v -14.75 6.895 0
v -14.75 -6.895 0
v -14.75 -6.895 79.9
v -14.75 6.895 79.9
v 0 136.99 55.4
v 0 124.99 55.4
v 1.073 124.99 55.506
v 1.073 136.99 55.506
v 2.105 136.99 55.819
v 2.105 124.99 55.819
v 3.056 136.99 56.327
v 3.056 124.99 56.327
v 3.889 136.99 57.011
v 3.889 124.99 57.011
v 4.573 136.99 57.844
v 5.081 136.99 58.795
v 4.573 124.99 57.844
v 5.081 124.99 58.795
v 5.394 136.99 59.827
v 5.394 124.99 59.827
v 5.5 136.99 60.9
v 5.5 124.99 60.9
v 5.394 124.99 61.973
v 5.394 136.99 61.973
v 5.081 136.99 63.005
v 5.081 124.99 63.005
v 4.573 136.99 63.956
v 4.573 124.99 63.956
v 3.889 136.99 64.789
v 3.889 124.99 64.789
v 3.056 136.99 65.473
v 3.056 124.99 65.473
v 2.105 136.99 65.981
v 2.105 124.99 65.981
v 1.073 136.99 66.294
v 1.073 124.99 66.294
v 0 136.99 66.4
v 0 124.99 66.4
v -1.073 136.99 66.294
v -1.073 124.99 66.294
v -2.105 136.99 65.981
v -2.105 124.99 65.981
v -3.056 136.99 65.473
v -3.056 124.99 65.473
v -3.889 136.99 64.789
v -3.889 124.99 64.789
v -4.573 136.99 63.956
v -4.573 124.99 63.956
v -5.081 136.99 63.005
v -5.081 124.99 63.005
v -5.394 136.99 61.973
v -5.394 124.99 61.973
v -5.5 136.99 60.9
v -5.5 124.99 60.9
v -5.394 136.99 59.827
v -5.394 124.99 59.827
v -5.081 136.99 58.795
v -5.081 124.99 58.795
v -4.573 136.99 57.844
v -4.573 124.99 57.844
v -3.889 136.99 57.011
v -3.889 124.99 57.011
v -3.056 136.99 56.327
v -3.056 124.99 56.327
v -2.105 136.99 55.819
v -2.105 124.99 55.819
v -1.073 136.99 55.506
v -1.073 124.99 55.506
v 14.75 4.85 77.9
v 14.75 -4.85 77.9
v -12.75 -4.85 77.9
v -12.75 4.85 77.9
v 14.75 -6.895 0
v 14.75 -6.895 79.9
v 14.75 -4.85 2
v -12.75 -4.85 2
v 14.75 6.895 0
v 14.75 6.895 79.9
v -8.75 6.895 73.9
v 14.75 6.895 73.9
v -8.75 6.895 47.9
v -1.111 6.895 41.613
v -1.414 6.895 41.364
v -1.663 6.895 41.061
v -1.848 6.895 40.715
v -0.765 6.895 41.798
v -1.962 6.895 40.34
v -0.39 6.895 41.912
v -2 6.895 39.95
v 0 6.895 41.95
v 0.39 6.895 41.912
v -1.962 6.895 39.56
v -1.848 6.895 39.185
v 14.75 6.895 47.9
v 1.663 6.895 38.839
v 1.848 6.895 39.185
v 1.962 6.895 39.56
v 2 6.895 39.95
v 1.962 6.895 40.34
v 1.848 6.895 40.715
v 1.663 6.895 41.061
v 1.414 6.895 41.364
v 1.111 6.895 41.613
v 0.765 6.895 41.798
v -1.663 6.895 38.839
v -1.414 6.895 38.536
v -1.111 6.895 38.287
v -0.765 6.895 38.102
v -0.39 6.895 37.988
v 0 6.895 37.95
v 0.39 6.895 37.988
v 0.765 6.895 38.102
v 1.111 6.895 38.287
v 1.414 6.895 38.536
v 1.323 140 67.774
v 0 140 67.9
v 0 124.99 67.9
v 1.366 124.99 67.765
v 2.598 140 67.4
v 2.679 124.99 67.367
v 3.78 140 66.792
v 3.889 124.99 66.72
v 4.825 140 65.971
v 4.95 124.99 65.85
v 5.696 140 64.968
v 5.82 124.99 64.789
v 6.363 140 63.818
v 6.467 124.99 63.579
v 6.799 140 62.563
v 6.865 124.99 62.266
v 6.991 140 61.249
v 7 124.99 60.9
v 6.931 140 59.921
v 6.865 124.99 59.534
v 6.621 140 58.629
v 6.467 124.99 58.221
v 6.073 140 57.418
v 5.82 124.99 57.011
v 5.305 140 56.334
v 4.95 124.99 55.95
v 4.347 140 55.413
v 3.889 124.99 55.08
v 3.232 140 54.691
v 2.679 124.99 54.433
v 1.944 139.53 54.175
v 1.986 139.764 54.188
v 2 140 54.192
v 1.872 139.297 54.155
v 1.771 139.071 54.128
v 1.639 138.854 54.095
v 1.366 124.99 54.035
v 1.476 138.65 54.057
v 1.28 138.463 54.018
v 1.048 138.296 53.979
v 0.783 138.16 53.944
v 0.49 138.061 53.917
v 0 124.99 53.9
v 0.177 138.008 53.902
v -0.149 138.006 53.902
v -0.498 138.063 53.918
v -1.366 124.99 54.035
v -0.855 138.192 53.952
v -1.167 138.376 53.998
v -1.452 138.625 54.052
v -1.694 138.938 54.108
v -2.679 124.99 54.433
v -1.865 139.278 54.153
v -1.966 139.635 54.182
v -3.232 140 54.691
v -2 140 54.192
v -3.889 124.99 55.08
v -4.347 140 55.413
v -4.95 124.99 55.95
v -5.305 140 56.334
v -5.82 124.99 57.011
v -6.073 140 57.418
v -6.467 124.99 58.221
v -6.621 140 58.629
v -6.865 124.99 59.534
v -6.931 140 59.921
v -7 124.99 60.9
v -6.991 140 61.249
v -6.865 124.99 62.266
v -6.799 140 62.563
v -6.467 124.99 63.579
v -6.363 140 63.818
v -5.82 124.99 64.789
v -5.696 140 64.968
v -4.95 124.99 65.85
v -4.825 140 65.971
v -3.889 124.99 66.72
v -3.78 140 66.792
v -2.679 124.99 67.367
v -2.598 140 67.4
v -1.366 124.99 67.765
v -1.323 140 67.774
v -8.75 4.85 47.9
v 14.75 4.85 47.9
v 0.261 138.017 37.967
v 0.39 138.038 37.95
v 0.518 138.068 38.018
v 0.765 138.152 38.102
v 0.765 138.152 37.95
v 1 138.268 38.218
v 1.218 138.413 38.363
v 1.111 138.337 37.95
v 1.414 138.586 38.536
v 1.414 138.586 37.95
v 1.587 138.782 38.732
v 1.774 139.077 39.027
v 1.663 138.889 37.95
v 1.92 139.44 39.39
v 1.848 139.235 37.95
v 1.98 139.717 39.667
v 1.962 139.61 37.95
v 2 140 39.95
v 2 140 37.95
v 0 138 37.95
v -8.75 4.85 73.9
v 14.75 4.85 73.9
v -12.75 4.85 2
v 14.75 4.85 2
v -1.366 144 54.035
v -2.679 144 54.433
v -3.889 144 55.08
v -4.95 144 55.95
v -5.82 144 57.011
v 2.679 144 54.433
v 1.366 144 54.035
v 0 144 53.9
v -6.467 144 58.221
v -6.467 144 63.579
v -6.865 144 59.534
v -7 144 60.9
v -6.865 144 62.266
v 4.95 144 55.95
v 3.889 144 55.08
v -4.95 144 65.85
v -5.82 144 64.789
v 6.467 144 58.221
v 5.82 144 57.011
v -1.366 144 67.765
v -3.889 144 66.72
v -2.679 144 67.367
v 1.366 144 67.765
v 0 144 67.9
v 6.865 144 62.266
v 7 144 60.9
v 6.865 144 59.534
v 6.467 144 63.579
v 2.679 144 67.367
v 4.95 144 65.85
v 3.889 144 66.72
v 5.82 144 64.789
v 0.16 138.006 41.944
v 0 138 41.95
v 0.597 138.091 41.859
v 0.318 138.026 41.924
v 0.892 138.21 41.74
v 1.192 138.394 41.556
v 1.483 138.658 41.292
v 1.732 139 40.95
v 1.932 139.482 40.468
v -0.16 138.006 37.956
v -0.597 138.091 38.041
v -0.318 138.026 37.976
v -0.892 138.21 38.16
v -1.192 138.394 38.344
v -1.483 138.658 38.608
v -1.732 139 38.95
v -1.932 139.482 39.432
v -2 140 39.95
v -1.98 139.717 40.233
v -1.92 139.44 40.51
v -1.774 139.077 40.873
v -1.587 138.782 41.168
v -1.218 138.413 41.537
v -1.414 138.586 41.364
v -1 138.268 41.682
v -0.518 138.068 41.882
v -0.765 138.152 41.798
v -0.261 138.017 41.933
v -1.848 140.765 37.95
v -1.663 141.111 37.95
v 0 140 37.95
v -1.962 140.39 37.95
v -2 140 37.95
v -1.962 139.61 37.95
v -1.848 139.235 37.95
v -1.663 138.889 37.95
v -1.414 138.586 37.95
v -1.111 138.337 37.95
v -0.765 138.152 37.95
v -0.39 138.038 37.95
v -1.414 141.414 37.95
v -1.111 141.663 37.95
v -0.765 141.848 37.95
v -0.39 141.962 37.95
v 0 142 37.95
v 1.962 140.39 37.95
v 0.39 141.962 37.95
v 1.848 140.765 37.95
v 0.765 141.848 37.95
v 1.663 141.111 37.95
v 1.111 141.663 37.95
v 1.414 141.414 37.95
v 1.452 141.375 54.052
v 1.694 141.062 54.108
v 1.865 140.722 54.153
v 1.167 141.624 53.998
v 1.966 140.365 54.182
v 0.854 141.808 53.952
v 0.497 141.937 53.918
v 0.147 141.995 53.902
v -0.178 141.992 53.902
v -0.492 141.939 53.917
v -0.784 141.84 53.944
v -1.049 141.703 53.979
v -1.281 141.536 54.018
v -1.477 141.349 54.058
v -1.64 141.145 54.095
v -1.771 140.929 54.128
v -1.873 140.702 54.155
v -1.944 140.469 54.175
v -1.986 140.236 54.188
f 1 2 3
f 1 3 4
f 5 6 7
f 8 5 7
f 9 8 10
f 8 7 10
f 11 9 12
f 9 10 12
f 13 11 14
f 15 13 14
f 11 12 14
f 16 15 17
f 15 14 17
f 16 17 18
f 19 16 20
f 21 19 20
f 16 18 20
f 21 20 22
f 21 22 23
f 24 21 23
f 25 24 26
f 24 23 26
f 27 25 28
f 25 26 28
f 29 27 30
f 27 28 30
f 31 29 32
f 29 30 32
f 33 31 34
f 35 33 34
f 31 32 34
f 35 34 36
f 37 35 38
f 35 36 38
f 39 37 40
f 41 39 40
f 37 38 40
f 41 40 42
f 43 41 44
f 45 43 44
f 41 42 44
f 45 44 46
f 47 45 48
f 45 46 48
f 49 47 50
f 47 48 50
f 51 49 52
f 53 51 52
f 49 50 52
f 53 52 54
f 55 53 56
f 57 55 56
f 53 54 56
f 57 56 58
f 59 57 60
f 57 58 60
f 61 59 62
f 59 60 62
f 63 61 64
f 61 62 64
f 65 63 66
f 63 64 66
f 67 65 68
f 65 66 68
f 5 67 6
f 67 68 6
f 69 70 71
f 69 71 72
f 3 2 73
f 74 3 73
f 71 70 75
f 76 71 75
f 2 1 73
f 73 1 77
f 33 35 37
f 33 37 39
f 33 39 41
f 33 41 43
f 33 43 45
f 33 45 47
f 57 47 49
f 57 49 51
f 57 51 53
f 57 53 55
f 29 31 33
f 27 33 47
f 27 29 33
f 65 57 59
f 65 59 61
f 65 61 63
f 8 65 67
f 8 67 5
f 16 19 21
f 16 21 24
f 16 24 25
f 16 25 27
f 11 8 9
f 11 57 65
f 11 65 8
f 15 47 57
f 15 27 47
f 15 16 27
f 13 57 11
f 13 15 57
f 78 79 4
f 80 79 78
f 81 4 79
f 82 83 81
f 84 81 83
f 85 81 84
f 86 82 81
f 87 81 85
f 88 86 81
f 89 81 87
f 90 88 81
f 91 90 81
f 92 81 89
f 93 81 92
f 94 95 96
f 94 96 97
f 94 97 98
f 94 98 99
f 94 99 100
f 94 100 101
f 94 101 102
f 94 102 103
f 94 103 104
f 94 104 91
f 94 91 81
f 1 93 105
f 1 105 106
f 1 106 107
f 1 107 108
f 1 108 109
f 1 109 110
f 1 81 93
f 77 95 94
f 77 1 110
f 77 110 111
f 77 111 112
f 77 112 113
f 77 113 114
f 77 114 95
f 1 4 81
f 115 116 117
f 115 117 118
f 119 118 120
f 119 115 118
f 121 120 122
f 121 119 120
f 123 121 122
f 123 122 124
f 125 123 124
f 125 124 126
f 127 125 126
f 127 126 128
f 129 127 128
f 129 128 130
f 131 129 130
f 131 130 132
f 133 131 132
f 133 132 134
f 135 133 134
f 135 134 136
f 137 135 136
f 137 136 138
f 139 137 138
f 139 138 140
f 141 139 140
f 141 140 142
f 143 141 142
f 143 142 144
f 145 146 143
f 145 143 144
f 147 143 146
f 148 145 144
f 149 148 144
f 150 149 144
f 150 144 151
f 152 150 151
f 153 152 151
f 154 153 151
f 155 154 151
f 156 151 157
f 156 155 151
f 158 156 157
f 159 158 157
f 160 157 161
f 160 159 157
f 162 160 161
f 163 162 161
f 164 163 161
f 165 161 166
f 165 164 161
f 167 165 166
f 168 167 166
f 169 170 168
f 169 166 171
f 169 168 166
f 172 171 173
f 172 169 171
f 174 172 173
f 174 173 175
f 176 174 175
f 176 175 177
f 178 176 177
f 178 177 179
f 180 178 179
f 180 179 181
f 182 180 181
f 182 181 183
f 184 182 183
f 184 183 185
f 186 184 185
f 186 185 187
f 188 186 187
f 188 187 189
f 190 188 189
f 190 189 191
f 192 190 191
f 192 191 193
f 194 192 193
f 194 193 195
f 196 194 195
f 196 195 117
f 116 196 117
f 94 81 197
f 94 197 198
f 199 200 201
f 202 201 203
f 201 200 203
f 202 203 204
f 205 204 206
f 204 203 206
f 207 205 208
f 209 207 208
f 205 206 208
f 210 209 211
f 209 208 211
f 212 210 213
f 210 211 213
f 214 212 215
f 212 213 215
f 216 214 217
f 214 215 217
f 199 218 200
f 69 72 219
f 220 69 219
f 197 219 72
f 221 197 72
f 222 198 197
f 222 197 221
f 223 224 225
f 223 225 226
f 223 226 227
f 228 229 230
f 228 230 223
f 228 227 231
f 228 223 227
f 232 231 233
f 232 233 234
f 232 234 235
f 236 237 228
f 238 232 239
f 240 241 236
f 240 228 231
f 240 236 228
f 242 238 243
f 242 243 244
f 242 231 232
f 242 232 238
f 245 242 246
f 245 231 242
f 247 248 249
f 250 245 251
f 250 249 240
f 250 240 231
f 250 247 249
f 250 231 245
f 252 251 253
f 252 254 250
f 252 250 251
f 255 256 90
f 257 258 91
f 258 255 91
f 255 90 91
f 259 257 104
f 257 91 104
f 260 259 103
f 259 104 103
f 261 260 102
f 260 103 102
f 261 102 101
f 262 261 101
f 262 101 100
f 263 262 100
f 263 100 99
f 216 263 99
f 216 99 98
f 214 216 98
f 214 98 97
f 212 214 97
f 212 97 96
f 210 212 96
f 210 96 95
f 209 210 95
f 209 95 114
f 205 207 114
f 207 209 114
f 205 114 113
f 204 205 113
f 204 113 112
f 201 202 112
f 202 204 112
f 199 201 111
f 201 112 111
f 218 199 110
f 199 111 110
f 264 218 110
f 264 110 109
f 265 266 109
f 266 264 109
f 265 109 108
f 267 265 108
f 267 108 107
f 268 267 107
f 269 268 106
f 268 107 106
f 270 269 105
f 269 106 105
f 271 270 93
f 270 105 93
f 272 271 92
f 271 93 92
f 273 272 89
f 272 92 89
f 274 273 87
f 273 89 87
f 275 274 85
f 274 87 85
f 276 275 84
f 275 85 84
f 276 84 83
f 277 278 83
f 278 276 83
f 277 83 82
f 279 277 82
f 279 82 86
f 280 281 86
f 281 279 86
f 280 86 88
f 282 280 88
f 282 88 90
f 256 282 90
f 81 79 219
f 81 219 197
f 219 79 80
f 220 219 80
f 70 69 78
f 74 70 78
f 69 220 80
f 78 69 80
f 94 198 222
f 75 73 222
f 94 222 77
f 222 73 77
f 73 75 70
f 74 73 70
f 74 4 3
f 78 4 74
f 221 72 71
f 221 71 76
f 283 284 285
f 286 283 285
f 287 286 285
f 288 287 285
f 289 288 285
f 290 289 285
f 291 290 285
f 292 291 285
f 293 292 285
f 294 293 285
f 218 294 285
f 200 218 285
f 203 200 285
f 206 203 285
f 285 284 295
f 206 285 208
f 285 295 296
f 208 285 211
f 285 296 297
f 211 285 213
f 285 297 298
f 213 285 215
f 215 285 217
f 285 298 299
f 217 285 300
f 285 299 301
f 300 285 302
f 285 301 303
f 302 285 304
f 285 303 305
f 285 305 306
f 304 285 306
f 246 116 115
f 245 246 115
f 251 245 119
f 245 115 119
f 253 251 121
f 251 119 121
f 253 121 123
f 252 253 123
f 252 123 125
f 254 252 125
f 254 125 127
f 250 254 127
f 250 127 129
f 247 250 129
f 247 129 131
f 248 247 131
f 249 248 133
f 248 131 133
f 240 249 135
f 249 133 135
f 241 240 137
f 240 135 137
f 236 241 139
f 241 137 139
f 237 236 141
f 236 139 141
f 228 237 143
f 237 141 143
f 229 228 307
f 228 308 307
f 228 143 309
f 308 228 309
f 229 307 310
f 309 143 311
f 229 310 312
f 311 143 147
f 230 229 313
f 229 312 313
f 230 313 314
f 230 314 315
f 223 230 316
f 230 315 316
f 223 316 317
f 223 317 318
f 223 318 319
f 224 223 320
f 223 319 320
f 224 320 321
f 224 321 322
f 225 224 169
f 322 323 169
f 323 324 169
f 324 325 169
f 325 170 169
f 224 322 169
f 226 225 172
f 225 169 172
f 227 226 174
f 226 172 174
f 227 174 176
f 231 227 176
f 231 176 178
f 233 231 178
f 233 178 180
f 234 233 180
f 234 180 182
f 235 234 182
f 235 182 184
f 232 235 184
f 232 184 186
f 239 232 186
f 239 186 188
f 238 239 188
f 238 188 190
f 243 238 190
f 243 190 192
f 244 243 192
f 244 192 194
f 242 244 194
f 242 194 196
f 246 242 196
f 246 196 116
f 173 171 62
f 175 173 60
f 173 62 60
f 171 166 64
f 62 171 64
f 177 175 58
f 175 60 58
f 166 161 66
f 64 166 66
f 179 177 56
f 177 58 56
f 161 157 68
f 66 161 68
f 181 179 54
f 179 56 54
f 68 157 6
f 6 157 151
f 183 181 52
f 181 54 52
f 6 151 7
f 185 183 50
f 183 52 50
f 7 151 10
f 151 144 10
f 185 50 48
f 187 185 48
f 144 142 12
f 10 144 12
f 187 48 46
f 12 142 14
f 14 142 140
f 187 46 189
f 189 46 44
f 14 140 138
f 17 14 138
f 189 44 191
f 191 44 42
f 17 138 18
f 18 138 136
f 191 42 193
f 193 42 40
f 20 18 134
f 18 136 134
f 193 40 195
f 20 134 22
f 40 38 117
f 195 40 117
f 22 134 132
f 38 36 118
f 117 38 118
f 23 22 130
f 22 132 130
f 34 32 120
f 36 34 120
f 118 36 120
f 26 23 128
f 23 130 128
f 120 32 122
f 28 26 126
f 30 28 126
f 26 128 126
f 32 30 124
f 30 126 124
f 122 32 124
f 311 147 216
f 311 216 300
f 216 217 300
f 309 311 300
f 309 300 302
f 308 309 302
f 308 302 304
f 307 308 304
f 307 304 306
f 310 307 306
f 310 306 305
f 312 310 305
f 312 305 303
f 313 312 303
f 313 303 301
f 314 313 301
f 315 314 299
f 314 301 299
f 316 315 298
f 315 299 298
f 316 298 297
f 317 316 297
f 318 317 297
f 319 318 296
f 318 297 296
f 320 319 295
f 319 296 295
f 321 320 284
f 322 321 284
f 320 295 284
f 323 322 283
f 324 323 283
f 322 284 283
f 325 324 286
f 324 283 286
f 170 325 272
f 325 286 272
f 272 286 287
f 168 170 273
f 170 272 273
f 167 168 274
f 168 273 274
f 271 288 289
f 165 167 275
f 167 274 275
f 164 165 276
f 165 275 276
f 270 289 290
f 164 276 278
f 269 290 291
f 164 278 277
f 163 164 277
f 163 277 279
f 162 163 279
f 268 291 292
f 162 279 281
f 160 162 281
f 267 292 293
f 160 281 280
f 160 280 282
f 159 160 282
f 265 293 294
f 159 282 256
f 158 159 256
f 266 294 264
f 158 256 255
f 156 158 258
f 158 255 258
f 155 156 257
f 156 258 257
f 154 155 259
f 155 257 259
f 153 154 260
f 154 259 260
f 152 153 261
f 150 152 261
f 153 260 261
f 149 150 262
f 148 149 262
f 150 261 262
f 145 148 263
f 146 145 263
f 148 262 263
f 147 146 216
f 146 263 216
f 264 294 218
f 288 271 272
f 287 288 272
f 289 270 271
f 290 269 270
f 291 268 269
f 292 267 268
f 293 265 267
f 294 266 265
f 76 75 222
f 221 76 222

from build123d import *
from build123d.topology import SkipClean

# Parameters (mm, degrees)
SKETCH4_R           = 2
BOSS_EXTRUDE1_DEPTH = 140
SKETCH5_W           = 29.5
SKETCH5_H           = 13.79
BOSS_EXTRUDE3_DEPTH = 79.9
SKETCH6_W           = 75.9
SKETCH6_H           = 9.7
CUT_EXTRUDE1_DEPTH  = 27.5
SKETCH7_W           = 23.5
SKETCH7_H           = 26
CUT_EXTRUDE2_DEPTH  = 3
SKETCH8_R           = 2
BOSS_EXTRUDE4_DEPTH = 22.95
SKETCH12_R          = 7
BOSS_EXTRUDE6_DEPTH = 15.01
SKETCH13_R          = 7
BOSS_EXTRUDE7_DEPTH = 4
SKETCH14_R          = 5.5
CUT_EXTRUDE3_DEPTH  = 12


with BuildPart() as part:
    # Sketch4 → Boss-Extrude1 (new body)
    with BuildSketch(Plane(origin=(0, 0, 0), x_dir=(1, 0, 0), z_dir=(0, 1, 0))):
        with Locations(Location((0, -39.95, 0), (0, 0, 270))):
            Circle(SKETCH4_R)
    extrude(amount=BOSS_EXTRUDE1_DEPTH)

    # Sketch5 → Boss-Extrude3 (add)
    with BuildSketch(Plane.XY):
        Rectangle(SKETCH5_W, SKETCH5_H)
    extrude(amount=BOSS_EXTRUDE3_DEPTH)

    # Sketch6 → Cut-Extrude1 (cut)
    with BuildSketch(Plane(origin=(14.75, 0, 0), x_dir=(0, 0, -1), z_dir=(1, 0, 0))):
        with Locations((-39.95, 0)):
            Rectangle(SKETCH6_W, SKETCH6_H)
    extrude(amount=-CUT_EXTRUDE1_DEPTH, mode=Mode.SUBTRACT)

    # Sketch7 → Cut-Extrude2 (cut)
    with BuildSketch(Plane(origin=(0, 6.895, 0), x_dir=(1, 0, 0), z_dir=(0, 1, 0))):
        with Locations((3, -60.9)):
            Rectangle(SKETCH7_W, SKETCH7_H)
    extrude(amount=-CUT_EXTRUDE2_DEPTH, mode=Mode.SUBTRACT)

    # Sketch8 → Boss-Extrude4 (add)
    with SkipClean():  # the faces are left unmerged after this step: merging them gives an invalid solid
        with BuildSketch(Plane.XY.offset(37.95)):
            with Locations((0, 140)):
                Circle(SKETCH8_R)
        extrude(amount=BOSS_EXTRUDE4_DEPTH)

    # Sketch12 → Boss-Extrude6 (add)
    with SkipClean():  # the faces are left unmerged after this step: merging them gives an invalid solid
        with BuildSketch(Plane(origin=(0, 140, 0), x_dir=(1, 0, 0), z_dir=(0, 1, 0))):
            with Locations(Location((0, -60.9, 0), (0, 0, 270))):
                Circle(SKETCH12_R)
        extrude(amount=-BOSS_EXTRUDE6_DEPTH)

    # Sketch13 → Boss-Extrude7 (add)
    with SkipClean():  # the faces are left unmerged after this step: merging them gives an invalid solid
        with BuildSketch(Plane(origin=(0, 140, 0), x_dir=(1, 0, 0), z_dir=(0, 1, 0))):
            with Locations(Location((0, -60.9, 0), (0, 0, 270))):
                Circle(SKETCH13_R)
        extrude(amount=BOSS_EXTRUDE7_DEPTH)

    # Sketch14 → Cut-Extrude3 (cut)
    with SkipClean():  # the faces are left unmerged after this step: merging them gives an invalid solid
        with BuildSketch(Plane.XZ.offset(-124.99)):
            with Locations(Location((0, 60.9, 0), (0, 0, 270))):
                Circle(SKETCH14_R)
        extrude(amount=-CUT_EXTRUDE3_DEPTH, mode=Mode.SUBTRACT)


solid = part.part
